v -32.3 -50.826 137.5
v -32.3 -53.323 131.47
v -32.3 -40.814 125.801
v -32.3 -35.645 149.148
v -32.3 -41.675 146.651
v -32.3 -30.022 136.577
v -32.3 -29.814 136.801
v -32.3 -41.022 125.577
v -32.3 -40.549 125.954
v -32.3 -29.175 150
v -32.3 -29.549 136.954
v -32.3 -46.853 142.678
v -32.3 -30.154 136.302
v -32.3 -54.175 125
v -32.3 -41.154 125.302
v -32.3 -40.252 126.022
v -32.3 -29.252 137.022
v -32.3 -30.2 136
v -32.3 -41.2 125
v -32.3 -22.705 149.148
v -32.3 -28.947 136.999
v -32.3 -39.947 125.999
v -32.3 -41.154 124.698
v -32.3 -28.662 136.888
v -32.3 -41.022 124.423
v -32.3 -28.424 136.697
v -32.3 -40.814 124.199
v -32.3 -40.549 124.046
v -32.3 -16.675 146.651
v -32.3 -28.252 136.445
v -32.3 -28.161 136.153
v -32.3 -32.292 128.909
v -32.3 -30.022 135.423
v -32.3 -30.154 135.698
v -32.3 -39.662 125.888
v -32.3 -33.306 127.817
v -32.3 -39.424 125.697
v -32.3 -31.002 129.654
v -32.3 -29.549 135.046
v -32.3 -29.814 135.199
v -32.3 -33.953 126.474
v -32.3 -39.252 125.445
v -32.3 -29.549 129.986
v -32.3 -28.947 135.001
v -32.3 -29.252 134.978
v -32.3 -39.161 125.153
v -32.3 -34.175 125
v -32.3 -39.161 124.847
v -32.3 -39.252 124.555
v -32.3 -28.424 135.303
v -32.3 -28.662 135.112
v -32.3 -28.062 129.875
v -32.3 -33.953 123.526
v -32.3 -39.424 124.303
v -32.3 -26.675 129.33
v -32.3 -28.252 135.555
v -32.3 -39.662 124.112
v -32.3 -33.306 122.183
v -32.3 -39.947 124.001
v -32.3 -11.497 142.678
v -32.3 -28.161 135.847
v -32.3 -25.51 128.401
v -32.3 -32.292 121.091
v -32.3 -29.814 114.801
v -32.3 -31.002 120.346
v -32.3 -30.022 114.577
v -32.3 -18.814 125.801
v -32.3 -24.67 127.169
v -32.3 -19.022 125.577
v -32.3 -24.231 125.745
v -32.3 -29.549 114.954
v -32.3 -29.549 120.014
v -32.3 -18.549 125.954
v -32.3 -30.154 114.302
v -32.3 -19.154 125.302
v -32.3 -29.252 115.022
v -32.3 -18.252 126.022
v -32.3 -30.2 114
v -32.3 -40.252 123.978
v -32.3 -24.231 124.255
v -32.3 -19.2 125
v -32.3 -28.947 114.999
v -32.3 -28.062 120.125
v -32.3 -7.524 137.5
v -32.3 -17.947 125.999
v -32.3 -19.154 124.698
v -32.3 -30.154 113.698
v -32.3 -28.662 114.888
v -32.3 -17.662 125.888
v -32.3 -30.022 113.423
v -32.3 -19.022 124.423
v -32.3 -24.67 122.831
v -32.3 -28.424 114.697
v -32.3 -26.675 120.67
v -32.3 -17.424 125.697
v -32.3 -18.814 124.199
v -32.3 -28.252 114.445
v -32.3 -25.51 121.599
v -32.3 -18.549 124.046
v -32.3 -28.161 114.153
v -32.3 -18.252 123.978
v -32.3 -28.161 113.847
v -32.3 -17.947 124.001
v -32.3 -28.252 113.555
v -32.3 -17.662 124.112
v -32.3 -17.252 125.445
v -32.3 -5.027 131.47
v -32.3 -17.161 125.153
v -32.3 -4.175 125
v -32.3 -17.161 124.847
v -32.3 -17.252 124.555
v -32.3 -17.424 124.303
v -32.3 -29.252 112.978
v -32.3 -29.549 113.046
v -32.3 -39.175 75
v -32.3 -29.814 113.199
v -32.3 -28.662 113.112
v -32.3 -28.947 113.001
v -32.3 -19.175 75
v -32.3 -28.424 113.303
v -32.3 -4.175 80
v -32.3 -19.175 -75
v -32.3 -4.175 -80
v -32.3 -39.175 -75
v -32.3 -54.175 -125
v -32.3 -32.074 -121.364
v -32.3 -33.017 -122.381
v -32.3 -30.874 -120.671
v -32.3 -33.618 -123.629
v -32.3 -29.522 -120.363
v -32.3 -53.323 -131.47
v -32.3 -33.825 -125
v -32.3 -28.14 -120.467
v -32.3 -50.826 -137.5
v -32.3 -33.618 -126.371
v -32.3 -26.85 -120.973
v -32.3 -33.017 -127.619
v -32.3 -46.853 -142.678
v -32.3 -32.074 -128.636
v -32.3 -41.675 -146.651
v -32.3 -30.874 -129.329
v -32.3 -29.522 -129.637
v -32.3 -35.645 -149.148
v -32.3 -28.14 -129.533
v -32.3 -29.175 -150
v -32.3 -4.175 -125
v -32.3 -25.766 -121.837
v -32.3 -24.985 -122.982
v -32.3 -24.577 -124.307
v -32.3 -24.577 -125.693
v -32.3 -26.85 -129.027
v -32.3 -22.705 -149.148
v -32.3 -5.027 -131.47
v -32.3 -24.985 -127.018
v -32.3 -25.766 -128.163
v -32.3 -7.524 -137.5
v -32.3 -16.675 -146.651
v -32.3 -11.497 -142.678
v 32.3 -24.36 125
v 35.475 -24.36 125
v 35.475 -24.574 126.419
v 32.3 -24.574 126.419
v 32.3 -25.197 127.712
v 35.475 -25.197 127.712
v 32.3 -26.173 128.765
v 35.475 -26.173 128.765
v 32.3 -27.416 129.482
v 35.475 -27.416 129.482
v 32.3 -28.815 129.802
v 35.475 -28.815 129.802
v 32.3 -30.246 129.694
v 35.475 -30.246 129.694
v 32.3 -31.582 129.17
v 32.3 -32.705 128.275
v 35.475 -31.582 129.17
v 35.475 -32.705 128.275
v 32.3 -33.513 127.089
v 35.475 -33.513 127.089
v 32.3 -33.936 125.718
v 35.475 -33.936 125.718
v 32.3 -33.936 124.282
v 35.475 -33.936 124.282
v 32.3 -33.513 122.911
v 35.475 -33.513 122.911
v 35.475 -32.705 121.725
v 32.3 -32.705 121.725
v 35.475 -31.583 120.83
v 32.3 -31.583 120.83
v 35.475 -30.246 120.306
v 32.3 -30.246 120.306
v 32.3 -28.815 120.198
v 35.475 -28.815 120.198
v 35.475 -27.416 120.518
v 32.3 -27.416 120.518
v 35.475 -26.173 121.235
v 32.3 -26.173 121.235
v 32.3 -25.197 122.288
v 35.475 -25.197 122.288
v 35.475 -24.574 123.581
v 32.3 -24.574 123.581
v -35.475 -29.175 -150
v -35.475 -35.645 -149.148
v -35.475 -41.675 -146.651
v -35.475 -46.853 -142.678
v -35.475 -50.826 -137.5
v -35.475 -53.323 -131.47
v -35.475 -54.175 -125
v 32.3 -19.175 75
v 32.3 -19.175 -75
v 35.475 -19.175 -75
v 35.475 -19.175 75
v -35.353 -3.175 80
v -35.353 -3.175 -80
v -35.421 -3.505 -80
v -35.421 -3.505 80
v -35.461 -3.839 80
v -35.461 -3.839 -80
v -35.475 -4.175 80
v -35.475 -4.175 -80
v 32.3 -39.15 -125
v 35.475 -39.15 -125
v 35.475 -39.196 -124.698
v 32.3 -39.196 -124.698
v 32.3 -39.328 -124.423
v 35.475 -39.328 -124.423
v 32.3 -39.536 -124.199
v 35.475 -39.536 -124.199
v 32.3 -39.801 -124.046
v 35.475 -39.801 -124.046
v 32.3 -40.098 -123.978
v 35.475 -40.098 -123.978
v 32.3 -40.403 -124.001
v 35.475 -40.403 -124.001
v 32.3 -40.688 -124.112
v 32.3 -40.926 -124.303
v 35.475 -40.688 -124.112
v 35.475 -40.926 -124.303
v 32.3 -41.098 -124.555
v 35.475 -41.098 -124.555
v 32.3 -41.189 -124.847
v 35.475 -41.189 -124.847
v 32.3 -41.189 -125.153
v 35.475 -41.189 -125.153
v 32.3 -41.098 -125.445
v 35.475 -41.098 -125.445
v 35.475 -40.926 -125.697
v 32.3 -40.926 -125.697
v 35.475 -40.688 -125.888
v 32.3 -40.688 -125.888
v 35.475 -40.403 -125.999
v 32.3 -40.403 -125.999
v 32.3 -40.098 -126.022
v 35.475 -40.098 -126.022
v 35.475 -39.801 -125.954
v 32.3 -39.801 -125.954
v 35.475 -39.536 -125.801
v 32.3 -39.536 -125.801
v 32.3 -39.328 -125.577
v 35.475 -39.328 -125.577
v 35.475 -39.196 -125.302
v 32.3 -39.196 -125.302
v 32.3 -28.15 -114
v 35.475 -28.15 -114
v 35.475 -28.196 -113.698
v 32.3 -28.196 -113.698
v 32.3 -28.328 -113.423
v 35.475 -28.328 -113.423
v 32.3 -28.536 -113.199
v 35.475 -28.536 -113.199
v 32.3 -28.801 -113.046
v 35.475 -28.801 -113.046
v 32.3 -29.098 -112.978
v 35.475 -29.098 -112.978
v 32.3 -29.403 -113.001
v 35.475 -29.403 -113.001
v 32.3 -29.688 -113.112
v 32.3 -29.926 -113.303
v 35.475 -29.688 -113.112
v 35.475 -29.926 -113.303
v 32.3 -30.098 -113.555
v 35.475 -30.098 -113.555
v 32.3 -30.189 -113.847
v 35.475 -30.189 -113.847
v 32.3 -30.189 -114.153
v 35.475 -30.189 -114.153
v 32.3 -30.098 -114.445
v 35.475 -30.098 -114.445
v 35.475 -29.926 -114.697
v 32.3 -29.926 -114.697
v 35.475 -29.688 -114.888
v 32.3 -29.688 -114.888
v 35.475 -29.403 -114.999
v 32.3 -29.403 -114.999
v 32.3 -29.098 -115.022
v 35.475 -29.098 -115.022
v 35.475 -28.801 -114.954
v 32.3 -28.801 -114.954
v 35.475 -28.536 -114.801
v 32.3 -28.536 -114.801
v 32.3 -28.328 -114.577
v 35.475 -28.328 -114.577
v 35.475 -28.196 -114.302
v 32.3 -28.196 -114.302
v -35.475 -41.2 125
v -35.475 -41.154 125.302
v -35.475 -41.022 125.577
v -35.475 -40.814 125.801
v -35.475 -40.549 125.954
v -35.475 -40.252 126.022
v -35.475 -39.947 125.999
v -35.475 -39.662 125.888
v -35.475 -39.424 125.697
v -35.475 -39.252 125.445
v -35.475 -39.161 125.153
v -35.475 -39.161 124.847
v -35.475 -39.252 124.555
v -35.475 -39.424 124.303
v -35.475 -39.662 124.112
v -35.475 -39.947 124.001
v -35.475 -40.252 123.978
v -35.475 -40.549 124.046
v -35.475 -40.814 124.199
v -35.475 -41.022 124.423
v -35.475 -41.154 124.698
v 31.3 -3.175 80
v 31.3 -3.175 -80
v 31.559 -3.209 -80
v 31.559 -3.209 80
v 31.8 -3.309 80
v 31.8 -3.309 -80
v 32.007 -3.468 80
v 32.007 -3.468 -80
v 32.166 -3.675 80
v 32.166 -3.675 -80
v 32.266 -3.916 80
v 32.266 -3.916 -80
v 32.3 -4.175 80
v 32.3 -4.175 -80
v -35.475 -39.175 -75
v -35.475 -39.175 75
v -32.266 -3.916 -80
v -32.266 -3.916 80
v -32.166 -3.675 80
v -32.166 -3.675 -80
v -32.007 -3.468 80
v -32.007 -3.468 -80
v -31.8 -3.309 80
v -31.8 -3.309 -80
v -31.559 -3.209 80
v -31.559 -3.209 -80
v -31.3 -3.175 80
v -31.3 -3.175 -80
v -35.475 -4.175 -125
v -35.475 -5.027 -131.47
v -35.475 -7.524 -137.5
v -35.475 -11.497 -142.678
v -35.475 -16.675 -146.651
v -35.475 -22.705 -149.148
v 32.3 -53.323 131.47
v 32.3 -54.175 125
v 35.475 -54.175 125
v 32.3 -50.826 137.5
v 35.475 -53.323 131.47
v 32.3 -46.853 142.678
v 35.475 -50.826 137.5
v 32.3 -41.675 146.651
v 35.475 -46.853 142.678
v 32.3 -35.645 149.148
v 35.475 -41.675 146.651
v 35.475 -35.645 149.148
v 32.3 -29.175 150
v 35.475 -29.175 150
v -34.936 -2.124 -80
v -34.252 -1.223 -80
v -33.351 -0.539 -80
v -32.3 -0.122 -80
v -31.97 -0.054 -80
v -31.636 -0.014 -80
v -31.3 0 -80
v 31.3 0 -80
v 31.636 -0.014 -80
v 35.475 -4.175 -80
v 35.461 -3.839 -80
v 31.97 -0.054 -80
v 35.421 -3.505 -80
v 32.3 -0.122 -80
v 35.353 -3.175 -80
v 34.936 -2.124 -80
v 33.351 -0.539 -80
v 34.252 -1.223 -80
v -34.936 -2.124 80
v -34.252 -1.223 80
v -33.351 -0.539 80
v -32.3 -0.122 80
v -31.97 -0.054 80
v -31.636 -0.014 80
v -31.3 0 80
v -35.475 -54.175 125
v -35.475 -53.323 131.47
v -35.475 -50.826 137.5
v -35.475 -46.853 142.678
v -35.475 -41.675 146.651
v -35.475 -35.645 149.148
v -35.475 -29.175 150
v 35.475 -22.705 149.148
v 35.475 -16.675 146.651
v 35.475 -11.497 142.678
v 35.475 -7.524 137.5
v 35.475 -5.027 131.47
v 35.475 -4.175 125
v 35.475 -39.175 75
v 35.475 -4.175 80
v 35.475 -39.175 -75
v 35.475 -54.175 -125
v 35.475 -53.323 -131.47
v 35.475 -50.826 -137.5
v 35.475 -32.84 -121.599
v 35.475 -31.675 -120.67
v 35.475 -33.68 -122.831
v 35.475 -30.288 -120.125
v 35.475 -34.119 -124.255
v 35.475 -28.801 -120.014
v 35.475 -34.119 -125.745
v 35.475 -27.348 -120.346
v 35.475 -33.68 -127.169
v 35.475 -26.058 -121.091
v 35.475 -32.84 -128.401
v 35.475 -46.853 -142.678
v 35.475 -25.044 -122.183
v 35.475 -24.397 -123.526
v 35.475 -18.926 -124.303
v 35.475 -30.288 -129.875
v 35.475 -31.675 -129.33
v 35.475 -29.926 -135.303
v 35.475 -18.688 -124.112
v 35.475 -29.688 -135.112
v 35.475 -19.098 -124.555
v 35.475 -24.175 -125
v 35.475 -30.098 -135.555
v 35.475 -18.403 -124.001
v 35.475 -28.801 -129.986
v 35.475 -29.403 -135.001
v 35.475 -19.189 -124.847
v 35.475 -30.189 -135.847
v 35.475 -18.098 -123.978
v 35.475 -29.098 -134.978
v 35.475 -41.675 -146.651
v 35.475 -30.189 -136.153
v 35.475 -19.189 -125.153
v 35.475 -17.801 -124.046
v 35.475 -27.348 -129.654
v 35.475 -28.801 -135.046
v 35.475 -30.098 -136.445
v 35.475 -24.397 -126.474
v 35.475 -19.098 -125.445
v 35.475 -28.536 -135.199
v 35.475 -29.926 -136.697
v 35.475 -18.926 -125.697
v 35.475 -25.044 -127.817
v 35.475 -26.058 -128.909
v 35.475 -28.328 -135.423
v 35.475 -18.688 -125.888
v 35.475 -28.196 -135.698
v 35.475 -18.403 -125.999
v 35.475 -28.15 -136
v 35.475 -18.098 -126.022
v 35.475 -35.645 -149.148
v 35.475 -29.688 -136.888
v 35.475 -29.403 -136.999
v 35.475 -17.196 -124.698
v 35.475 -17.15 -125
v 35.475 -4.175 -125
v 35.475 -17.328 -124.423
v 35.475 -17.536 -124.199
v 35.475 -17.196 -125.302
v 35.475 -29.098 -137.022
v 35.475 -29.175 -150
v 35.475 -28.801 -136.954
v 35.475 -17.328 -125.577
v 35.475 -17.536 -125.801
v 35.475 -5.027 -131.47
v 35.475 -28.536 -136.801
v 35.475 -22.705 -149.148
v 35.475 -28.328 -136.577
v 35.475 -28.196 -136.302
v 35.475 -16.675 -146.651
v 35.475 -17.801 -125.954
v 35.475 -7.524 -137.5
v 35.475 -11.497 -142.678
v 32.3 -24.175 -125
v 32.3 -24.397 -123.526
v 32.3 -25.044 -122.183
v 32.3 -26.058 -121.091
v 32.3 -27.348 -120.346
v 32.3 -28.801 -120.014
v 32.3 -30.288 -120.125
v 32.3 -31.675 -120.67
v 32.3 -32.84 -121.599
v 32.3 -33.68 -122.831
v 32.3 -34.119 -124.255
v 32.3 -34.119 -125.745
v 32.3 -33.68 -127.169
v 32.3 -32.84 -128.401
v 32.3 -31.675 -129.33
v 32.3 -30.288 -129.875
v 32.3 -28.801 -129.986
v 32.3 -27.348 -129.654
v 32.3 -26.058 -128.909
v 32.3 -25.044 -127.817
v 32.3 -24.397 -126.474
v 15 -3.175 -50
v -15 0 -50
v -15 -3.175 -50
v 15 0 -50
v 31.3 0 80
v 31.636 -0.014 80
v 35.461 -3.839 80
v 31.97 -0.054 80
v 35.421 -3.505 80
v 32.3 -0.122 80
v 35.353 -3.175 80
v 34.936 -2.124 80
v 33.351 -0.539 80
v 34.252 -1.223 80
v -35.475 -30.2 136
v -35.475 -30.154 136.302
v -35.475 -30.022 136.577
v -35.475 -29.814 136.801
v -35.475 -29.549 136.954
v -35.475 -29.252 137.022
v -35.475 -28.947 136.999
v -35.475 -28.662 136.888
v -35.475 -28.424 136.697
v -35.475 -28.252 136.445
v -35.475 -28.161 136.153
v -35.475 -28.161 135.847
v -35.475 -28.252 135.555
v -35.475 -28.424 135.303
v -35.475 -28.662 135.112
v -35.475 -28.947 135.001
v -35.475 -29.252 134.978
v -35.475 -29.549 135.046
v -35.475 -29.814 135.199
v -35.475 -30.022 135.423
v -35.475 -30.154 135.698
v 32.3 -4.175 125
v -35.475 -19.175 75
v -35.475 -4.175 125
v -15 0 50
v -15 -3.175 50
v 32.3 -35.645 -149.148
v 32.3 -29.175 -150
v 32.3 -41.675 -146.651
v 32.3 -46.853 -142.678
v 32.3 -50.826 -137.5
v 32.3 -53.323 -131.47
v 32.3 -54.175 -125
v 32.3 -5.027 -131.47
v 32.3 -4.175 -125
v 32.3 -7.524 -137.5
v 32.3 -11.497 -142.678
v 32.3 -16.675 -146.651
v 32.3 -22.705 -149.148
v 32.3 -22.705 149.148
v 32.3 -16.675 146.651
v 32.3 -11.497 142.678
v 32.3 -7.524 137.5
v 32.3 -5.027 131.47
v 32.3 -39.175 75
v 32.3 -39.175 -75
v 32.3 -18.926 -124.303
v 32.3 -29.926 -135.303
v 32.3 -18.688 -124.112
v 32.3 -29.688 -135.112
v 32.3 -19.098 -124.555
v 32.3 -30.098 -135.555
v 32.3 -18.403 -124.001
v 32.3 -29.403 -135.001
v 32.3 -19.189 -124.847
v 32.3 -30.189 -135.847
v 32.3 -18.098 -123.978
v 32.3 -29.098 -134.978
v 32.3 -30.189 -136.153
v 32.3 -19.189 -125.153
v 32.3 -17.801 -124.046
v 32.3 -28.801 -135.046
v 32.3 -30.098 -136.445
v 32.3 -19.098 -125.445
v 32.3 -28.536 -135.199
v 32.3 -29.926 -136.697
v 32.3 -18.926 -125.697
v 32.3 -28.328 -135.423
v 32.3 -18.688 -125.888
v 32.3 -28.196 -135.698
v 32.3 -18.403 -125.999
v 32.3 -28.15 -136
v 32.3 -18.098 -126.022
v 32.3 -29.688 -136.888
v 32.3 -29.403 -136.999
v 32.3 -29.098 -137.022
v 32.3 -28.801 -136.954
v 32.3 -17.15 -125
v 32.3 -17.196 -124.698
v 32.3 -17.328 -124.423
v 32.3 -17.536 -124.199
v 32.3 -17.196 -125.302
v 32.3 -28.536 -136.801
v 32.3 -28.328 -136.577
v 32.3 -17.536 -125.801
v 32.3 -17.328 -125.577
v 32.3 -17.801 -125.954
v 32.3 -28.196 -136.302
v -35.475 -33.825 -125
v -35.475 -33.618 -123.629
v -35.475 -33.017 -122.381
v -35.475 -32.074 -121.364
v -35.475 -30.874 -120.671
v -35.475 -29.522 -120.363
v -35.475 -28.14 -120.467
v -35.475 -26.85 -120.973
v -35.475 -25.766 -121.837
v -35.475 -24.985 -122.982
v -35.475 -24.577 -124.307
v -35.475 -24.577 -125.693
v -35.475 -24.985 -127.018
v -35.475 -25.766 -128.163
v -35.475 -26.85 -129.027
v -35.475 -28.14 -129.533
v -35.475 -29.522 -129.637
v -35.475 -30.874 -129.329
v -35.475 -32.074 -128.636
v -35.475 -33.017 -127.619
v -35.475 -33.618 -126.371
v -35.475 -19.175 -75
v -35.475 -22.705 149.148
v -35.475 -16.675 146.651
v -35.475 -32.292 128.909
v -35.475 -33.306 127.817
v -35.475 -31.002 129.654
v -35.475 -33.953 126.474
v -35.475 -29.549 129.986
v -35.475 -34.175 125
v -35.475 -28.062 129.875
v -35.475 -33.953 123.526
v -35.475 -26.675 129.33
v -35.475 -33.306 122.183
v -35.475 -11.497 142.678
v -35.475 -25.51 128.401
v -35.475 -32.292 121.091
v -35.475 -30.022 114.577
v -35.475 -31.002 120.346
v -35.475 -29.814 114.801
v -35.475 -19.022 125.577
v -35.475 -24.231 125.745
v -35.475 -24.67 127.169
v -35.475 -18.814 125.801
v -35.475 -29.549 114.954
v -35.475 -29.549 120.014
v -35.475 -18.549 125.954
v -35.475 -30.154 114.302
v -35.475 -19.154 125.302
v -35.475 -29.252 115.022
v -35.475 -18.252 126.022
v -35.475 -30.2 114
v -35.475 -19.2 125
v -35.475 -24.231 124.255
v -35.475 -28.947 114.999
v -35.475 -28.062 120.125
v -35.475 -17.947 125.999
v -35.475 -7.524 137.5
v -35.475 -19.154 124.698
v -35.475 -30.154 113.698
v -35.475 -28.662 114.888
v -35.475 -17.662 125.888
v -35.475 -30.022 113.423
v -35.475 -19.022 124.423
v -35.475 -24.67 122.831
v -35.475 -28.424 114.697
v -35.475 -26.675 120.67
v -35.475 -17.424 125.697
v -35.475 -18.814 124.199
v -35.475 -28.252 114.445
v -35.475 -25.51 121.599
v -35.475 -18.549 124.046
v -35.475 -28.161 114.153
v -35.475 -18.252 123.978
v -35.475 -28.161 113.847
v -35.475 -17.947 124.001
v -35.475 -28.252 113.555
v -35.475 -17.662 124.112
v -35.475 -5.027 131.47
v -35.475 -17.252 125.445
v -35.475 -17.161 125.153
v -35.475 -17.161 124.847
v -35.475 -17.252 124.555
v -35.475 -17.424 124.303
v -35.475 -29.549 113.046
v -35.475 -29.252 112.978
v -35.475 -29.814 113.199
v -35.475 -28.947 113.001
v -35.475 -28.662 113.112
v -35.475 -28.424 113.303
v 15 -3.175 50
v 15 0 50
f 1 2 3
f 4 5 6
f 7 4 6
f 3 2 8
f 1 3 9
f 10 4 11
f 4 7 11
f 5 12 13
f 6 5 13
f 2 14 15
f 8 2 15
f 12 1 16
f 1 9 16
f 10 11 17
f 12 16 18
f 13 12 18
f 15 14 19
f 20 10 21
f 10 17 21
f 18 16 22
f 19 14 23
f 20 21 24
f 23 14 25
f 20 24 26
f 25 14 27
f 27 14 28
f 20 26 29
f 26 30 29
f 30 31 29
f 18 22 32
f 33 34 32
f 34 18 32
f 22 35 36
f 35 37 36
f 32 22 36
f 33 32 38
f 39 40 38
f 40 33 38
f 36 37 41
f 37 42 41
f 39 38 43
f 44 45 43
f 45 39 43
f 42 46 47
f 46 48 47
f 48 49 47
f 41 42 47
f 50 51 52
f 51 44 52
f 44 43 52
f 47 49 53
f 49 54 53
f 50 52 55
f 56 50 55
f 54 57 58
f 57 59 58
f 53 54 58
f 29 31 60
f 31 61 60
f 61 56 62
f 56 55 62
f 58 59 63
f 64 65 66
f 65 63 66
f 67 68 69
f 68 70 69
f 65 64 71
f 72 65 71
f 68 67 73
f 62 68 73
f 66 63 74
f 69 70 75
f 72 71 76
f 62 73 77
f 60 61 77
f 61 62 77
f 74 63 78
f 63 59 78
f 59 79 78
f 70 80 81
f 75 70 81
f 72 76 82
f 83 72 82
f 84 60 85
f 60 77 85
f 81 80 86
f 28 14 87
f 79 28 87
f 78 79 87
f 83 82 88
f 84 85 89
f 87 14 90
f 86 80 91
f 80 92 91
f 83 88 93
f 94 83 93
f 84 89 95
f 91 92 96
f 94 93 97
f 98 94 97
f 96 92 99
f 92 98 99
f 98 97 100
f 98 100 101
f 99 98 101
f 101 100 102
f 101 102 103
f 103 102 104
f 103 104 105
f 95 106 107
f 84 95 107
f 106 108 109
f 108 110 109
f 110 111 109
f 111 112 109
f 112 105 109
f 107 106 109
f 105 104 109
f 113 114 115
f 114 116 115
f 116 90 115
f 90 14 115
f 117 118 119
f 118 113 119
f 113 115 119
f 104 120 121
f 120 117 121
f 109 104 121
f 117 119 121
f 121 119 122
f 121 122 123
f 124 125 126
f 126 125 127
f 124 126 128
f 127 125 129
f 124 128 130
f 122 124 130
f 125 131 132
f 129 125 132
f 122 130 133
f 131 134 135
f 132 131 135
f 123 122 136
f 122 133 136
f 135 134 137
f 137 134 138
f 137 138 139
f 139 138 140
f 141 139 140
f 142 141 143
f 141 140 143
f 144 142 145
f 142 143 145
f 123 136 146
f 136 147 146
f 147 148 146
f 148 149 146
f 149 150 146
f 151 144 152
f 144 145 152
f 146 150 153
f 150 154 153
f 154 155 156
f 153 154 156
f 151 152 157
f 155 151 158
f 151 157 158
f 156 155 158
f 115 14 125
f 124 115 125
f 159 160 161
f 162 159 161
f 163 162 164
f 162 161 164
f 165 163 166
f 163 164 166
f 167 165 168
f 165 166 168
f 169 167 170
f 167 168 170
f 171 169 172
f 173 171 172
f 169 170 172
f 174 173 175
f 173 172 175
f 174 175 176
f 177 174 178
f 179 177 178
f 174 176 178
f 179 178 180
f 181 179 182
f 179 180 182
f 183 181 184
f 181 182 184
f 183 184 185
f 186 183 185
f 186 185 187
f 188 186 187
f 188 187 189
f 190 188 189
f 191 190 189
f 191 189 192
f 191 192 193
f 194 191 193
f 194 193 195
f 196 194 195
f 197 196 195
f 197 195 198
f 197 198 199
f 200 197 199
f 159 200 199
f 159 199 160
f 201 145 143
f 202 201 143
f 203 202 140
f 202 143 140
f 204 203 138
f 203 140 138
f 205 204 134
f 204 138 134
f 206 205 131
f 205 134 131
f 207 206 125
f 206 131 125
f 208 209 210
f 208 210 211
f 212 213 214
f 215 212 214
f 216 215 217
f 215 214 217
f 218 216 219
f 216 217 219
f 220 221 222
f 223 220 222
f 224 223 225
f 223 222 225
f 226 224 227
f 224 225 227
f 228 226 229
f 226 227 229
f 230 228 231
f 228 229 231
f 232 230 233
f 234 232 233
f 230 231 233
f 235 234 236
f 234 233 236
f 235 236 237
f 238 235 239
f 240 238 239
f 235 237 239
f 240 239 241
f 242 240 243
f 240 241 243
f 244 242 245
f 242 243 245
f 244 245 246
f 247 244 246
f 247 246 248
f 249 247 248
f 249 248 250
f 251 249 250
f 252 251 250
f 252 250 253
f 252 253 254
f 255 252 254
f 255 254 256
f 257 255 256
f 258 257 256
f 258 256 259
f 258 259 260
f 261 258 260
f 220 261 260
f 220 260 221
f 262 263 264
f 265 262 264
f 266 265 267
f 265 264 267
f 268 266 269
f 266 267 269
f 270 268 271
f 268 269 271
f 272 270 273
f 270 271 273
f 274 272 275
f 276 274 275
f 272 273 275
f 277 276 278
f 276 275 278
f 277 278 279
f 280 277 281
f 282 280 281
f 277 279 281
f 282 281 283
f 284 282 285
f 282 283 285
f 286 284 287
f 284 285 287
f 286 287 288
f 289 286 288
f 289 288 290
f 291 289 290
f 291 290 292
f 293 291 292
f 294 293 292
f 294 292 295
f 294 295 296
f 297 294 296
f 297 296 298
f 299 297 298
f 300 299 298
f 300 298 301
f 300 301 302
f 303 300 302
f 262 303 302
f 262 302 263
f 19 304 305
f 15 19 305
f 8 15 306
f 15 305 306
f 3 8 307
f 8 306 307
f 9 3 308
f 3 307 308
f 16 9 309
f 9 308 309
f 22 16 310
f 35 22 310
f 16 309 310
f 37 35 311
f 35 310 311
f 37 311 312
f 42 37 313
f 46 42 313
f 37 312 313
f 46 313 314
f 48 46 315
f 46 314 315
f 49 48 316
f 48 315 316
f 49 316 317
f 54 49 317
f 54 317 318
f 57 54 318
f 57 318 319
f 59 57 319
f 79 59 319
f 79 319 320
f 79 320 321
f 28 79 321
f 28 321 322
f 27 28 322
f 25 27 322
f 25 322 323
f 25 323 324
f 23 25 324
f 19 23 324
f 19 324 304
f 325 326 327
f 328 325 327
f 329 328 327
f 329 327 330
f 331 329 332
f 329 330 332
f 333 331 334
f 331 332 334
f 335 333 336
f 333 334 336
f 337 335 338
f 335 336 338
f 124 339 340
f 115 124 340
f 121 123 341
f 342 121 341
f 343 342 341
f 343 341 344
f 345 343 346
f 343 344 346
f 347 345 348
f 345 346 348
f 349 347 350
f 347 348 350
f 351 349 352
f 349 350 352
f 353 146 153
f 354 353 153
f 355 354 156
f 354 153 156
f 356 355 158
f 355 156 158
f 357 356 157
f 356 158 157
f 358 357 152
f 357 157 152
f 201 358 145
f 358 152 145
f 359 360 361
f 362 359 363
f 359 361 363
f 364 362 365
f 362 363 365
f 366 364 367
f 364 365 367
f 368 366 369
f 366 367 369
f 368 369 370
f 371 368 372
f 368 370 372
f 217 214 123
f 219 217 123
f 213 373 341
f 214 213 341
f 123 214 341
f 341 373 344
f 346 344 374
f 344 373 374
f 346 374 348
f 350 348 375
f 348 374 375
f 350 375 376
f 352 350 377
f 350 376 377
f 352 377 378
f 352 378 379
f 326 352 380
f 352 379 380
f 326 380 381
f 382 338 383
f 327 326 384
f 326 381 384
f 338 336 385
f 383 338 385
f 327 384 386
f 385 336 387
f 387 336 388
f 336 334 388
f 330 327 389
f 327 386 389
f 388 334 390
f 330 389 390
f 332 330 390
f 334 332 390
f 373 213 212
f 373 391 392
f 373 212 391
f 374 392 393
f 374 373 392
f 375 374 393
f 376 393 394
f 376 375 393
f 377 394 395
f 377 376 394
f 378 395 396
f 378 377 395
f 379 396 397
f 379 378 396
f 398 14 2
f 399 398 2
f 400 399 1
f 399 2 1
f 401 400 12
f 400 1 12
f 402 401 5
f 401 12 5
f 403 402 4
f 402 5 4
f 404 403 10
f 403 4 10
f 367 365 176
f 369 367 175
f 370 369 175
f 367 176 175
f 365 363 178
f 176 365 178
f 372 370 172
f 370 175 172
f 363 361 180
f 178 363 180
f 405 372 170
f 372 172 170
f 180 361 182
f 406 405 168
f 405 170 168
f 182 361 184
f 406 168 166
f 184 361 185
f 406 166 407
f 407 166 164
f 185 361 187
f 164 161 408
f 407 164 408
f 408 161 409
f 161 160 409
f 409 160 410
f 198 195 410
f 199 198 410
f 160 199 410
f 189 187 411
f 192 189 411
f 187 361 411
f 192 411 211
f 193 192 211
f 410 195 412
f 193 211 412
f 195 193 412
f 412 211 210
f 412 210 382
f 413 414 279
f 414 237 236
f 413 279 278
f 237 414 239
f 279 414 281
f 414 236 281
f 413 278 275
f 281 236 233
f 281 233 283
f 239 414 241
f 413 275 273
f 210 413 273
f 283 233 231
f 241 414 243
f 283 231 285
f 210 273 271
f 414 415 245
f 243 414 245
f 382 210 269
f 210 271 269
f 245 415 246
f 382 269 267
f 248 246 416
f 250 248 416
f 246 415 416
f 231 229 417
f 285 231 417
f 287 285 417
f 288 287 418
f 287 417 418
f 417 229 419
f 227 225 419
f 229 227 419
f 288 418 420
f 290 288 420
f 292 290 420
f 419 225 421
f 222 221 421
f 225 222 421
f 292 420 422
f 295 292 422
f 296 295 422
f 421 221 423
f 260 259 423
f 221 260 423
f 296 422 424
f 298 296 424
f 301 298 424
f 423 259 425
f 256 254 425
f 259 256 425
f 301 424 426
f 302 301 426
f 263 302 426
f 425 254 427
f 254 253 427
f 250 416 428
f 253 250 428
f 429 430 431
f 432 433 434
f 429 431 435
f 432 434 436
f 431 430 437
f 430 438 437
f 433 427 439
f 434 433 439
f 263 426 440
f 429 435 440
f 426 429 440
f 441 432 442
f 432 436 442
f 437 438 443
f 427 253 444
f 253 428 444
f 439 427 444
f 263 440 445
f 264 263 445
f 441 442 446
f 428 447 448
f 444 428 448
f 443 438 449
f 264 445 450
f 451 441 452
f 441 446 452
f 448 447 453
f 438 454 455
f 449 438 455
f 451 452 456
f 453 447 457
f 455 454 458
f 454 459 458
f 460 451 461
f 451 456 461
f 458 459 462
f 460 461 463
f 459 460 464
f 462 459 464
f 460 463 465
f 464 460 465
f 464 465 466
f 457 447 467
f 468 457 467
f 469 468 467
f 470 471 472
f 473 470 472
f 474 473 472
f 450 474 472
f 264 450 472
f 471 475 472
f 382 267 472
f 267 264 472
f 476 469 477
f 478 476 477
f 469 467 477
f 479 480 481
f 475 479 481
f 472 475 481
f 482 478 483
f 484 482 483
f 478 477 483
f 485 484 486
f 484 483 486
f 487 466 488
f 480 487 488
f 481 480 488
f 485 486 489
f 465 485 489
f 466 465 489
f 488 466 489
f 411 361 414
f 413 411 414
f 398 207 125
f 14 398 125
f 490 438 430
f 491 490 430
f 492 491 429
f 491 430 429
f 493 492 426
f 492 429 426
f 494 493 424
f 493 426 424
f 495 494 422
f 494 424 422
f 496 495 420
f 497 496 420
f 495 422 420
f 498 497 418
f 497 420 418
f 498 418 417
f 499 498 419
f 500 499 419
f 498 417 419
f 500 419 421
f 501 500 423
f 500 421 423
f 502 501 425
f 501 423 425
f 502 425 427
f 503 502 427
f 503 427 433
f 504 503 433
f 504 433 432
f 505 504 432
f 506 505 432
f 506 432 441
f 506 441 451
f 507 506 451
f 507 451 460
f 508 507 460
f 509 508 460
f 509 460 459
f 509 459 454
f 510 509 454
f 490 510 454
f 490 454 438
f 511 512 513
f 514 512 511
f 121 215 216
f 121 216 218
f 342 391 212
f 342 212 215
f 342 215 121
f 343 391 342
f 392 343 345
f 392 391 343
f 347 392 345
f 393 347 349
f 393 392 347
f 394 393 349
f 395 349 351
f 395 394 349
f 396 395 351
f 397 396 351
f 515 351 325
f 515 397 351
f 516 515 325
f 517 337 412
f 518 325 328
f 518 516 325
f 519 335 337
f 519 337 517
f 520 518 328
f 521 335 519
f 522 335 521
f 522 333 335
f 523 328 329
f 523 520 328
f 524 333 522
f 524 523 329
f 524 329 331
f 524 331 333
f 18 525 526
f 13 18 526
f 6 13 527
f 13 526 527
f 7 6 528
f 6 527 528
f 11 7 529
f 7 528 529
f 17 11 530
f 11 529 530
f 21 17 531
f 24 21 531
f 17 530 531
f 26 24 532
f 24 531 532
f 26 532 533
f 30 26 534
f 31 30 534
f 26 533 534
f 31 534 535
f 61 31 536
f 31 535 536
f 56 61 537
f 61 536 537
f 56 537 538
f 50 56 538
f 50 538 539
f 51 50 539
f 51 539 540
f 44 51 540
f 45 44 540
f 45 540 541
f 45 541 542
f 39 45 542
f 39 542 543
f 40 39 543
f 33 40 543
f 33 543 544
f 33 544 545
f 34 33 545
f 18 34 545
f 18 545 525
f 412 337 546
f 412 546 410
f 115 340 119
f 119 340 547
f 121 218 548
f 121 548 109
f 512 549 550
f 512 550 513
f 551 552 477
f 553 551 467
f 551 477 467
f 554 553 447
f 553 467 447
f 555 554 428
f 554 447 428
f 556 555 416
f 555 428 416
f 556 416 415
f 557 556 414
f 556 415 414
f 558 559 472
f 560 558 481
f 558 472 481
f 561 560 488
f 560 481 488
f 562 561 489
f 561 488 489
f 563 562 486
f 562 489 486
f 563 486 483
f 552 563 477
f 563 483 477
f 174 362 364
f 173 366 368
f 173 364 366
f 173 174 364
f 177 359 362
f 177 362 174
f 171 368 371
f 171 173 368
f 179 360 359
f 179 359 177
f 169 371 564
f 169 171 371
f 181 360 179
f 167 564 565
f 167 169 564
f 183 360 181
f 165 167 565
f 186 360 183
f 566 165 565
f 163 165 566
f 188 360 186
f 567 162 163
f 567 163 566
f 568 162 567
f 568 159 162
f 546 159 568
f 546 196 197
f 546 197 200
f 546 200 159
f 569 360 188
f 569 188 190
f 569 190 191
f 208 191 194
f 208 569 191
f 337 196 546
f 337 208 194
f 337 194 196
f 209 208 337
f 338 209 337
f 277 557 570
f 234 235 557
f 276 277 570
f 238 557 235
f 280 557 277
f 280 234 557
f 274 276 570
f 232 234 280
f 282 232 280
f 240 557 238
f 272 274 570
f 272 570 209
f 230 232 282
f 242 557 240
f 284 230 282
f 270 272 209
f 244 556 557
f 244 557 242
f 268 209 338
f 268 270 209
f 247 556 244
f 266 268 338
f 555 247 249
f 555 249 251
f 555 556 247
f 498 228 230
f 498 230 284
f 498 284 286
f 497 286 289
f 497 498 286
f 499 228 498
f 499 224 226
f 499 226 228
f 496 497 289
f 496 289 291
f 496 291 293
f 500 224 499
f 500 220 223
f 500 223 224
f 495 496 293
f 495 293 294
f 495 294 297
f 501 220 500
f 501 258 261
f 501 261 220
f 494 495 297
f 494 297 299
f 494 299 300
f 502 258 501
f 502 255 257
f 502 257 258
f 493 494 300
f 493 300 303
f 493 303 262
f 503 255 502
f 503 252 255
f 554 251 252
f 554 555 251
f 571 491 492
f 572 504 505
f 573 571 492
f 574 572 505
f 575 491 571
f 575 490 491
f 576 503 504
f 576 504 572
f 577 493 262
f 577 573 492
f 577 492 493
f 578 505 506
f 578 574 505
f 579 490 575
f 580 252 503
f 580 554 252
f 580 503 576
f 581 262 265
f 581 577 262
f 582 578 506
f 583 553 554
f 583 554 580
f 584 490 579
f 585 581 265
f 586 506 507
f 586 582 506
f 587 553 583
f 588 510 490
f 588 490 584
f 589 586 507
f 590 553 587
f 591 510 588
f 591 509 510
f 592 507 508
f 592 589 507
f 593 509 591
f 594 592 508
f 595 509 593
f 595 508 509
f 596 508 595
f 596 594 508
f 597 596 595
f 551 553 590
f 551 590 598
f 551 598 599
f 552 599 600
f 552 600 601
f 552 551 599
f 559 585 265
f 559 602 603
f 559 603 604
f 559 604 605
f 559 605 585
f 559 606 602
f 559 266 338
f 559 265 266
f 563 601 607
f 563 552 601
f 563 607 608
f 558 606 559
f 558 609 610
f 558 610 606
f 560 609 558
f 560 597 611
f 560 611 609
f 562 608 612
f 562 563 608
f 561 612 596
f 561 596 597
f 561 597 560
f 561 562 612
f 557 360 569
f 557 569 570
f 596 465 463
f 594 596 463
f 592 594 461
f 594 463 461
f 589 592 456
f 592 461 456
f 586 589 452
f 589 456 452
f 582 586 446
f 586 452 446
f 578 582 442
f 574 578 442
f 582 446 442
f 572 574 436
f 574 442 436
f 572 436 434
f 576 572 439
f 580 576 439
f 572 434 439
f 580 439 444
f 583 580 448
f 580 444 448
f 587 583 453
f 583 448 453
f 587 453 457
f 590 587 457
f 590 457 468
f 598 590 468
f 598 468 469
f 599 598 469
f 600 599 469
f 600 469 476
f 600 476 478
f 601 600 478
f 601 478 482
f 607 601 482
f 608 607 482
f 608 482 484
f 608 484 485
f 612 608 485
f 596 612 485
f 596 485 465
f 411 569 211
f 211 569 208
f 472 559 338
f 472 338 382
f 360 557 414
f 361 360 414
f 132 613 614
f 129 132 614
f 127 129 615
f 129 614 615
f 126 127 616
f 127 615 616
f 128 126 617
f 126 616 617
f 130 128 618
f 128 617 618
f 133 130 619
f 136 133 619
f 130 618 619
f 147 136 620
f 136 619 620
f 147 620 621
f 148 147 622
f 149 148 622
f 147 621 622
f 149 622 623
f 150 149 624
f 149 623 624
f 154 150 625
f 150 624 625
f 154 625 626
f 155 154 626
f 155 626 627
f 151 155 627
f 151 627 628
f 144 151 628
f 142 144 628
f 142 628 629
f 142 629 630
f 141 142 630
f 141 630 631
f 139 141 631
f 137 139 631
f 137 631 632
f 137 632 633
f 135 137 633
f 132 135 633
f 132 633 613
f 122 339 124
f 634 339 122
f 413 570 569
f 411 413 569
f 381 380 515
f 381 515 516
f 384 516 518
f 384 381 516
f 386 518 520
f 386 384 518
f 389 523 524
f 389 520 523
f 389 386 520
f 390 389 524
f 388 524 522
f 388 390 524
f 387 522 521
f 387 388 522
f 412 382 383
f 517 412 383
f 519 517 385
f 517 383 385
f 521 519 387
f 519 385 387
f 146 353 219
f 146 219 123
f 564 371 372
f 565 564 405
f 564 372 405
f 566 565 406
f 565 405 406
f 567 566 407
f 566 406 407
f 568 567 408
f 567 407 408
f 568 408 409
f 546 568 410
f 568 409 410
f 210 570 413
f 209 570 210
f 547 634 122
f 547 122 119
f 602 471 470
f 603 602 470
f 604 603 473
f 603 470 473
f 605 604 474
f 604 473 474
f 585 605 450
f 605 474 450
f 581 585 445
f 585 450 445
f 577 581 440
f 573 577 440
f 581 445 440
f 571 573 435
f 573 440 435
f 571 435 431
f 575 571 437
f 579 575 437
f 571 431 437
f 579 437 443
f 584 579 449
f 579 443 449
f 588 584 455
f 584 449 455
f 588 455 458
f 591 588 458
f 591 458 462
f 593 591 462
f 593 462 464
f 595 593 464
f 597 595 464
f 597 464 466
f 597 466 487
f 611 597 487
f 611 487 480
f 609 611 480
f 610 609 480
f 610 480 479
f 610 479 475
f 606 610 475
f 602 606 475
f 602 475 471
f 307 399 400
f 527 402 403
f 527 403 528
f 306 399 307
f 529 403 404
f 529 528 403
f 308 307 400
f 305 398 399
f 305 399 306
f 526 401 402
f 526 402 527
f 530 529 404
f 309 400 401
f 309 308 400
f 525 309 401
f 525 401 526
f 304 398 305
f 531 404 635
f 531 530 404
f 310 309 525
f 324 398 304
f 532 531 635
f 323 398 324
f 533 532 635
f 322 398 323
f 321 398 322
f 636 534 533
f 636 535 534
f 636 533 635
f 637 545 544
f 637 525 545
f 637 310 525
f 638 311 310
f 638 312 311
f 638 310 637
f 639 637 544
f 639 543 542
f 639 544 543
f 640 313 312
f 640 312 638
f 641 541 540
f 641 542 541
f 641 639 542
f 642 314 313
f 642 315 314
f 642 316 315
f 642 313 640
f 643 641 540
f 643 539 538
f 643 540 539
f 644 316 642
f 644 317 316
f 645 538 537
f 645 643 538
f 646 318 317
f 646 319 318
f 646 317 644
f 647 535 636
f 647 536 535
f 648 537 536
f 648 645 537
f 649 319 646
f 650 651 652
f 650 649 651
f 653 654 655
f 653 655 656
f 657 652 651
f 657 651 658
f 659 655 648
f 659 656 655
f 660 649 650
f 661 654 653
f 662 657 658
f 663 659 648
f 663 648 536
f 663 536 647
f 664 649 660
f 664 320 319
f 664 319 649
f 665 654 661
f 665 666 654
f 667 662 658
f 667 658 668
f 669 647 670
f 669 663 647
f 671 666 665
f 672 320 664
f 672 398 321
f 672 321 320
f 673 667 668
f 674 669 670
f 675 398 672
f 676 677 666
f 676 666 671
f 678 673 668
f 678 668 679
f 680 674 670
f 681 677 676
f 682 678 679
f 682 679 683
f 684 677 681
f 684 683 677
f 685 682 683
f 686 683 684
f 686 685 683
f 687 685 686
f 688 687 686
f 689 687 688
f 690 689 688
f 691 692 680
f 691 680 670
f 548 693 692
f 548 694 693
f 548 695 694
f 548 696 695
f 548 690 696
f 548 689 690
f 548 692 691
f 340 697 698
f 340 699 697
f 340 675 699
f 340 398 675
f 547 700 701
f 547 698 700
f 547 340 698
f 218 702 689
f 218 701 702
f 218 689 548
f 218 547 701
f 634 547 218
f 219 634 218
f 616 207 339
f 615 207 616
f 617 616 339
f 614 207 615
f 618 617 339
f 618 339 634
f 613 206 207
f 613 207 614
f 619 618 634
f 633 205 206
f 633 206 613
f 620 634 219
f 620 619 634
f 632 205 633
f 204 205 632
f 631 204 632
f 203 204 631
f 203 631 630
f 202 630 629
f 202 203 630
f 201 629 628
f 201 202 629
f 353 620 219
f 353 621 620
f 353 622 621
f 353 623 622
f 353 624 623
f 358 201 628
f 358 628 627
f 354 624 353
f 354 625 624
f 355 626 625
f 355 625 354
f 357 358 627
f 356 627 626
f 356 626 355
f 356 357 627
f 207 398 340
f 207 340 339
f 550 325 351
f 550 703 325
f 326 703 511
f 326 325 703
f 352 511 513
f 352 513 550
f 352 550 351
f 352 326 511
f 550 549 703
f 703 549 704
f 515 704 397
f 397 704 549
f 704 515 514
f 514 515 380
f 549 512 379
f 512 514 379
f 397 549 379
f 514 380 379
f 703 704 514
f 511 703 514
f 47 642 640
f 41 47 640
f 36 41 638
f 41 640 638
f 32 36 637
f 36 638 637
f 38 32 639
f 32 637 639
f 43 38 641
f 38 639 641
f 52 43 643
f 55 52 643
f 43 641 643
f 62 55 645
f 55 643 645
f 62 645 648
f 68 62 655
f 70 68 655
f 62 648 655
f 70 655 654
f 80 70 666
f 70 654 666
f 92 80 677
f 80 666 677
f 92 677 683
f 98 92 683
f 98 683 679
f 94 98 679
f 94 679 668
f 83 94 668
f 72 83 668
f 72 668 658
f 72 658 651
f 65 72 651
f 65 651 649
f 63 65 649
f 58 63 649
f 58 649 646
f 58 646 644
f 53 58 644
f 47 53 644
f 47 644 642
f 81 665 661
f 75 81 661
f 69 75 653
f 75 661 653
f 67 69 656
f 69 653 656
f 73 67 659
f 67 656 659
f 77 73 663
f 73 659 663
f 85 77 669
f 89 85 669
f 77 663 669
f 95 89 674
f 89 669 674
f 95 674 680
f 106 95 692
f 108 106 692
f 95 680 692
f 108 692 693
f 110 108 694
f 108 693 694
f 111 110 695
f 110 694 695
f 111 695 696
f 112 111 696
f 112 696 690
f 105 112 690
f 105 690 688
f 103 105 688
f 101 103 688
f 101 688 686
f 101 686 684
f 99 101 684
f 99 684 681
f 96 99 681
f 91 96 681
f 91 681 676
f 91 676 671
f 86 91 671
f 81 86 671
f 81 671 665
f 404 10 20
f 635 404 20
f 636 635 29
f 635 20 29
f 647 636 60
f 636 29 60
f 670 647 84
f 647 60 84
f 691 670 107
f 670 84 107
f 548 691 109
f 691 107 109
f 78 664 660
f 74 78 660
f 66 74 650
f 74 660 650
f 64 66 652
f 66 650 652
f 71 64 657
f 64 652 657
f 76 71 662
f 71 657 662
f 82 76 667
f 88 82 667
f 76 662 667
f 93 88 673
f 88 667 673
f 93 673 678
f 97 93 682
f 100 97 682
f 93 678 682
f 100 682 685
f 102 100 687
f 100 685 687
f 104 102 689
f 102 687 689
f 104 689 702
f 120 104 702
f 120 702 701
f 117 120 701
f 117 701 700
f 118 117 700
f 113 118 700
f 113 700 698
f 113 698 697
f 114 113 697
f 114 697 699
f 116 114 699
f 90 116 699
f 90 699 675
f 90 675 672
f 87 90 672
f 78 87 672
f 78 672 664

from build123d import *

# Parameters (mm, degrees)
BASE_FLANGE1_DEPTH         = 3.175
SKETCHED_START             = -150
SKETCHED_BEND1_DEPTH       = 300
SKETCHED_BEND1_2_DEPTH     = 70
SKETCHED_START_2           = 80
SKETCHED_BEND1_3_DEPTH     = 70
SKETCHED_BEND1_4_OUTLINE_W = 3.175
SKETCHED_BEND1_4_OUTLINE_H = 50
SKETCHED_BEND1_4_DEPTH     = 300
SKETCHED_START_3           = -80
SKETCHED_BEND1_5_DEPTH     = 160
SKETCH7_R                  = 4.815
CUT_EXTRUDE1_DEPTH         = 10
SKETCH8_R                  = 5
SKETCH8_R_2                = 1.025
CUT_EXTRUDE2_DEPTH         = 10
SKETCH9_R                  = 4.65
SKETCH9_R_2                = 5
SKETCH9_R_3                = 1.025
CUT_EXTRUDE3_DEPTH         = 10
CUT_EXTRUDE4_DEPTH         = 175.553238655
CUT_EXTRUDE5_DEPTH         = 175.553238655
SKETCH13_W                 = 30
SKETCH13_H                 = 100
CUT_EXTRUDE6_DEPTH         = 10
SKETCH14_W                 = 150
SKETCH14_H                 = 20
CUT_EXTRUDE7_DEPTH         = 175.553238655


# Read off the part's stored shape, not the designer's step: Sketched Bend1
# Sheet-metal steps are written as plain solids
with BuildPart() as part:
    # Sketch1 → Base-Flange1 (new body)
    with BuildSketch(Plane(origin=(0, 0, 0), x_dir=(1, 0, 0), z_dir=(0, 1, 0))):
        Polygon((-82.3, 150), (-32.3, 150), (-32.3, 80), (32.3, 80), (32.3, 150), (82.3, 150), (82.3, -150), (32.3, -150), (32.3, -80), (-32.3, -80), (-32.3, -150), (-82.3, -150), align=None)
    extrude(amount=-BASE_FLANGE1_DEPTH)

    # Sketched Bend1 outline → Sketched Bend1 (cut)
    with BuildSketch(Plane.XY.offset(SKETCHED_START)):
        with BuildLine():
            Line((-82.3, -3.175), (-35.353470735, -3.175))
            ThreePointArc((-35.353470735, -3.175), (-33.874453825, -0.888236775), (-31.3, 0))
            Line((-31.3, 0), (-82.3, 0))
            Line((-82.3, 0), (-82.3, -3.175))
        make_face()
        with BuildLine():
            Line((82.3, 0), (31.3, 0))
            ThreePointArc((31.3, 0), (33.874453825, -0.888236775), (35.353470735, -3.175))
            Line((35.353470735, -3.175), (82.3, -3.175))
            Line((82.3, -3.175), (82.3, 0))
        make_face()
    extrude(amount=SKETCHED_BEND1_DEPTH, mode=Mode.SUBTRACT)

    # Sketched Bend1 2 outline → Sketched Bend1 2 (cut)
    with BuildSketch(Plane.XY.offset(SKETCHED_START)):
        with BuildLine():
            Line((-35.353470735, -3.175), (-32.3, -3.175))
            Line((-32.3, -3.175), (-32.3, -0.121529265))
            ThreePointArc((-32.3, -0.121529265), (-34.252170811, -1.222829189), (-35.353470735, -3.175))
        make_face()
        with BuildLine():
            Line((32.3, -0.121529265), (32.3, -3.175))
            Line((32.3, -3.175), (35.353470735, -3.175))
            ThreePointArc((35.353470735, -3.175), (34.252170811, -1.222829189), (32.3, -0.121529265))
        make_face()
    extrude(amount=SKETCHED_BEND1_2_DEPTH, mode=Mode.SUBTRACT)

    # Sketched Bend1 3 outline → Sketched Bend1 3 (cut)
    with BuildSketch(Plane.XY.offset(SKETCHED_START_2)):
        with BuildLine():
            Line((-35.353470735, -3.175), (-32.3, -3.175))
            Line((-32.3, -3.175), (-32.3, -0.121529265))
            ThreePointArc((-32.3, -0.121529265), (-34.252170811, -1.222829189), (-35.353470735, -3.175))
        make_face()
        with BuildLine():
            Line((32.3, -0.121529265), (32.3, -3.175))
            Line((32.3, -3.175), (35.353470735, -3.175))
            ThreePointArc((35.353470735, -3.175), (34.252170811, -1.222829189), (32.3, -0.121529265))
        make_face()
    extrude(amount=SKETCHED_BEND1_3_DEPTH, mode=Mode.SUBTRACT)



with BuildPart() as body_2:
    # Sketched Bend1 4 outline → Sketched Bend1 4 (new body)
    with BuildSketch(Plane.XY.offset(SKETCHED_START)):
        with Locations((-33.8875, -29.175)):
            Rectangle(SKETCHED_BEND1_4_OUTLINE_W, SKETCHED_BEND1_4_OUTLINE_H)
        with Locations((33.8875, -29.175)):
            Rectangle(SKETCHED_BEND1_4_OUTLINE_W, SKETCHED_BEND1_4_OUTLINE_H)
    extrude(amount=SKETCHED_BEND1_4_DEPTH)


with BuildPart() as part_1:
    add(part.part)

    add(body_2.part)  # Sketched Bend1 5 merges body 2
    # Sketched Bend1 5 outline → Sketched Bend1 5 (add)
    with BuildSketch(Plane.XY.offset(SKETCHED_START_3)):
        with BuildLine():
            Line((-35.475, -4.175), (-32.3, -4.175))
            ThreePointArc((-32.3, -4.175), (-32.007106781, -3.467893219), (-31.3, -3.175))
            Line((-31.3, -3.175), (-35.353470735, -3.175))
            ThreePointArc((-35.353470735, -3.175), (-35.444506323, -3.671321193), (-35.475, -4.175))
        make_face()
        with BuildLine():
            Line((35.353470735, -3.175), (31.3, -3.175))
            ThreePointArc((31.3, -3.175), (32.007106781, -3.467893219), (32.3, -4.175))
            Line((32.3, -4.175), (35.475, -4.175))
            ThreePointArc((35.475, -4.175), (35.444506323, -3.671321193), (35.353470735, -3.175))
        make_face()
    extrude(amount=SKETCHED_BEND1_5_DEPTH)

    # Sketch7 → Cut-Extrude1 (cut)
    with BuildSketch(Plane(origin=(35.475, 0, 0), x_dir=(0, 0, -1), z_dir=(1, 0, 0))):
        with Locations(Location((-125, -29.175, 0), (0, 0, 90))):
            Circle(SKETCH7_R)
    extrude(amount=-CUT_EXTRUDE1_DEPTH, mode=Mode.SUBTRACT)

    # Sketch8 → Cut-Extrude2 (cut)
    with BuildSketch(Plane(origin=(35.475, 0, 0), x_dir=(0, 0, -1), z_dir=(1, 0, 0))):
        with Locations(Location((125, -29.175, 0), (0, 0, 90))):
            Circle(SKETCH8_R)
        with Locations(Location((125, -18.175, 0), (0, 0, 90))):
            Circle(SKETCH8_R_2)
        with Locations(Location((125, -40.175, 0), (0, 0, 90))):
            Circle(SKETCH8_R_2)
        with Locations(Location((136, -29.175, 0), (0, 0, 90))):
            Circle(SKETCH8_R_2)
        with Locations(Location((114, -29.175, 0), (0, 0, 90))):
            Circle(SKETCH8_R_2)
    extrude(amount=-CUT_EXTRUDE2_DEPTH, mode=Mode.SUBTRACT)

    # Sketch9 → Cut-Extrude3 (cut)
    with BuildSketch(Plane.ZY.offset(35.475)):
        with Locations(Location((-125, -29.175, 0), (0, 0, 270))):
            Circle(SKETCH9_R)
        with Locations(Location((125, -29.175, 0), (0, 0, 270))):
            Circle(SKETCH9_R_2)
        with Locations(Location((125, -18.175, 0), (0, 0, 270))):
            Circle(SKETCH9_R_3)
        with Locations(Location((114, -29.175, 0), (0, 0, 270))):
            Circle(SKETCH9_R_3)
        with Locations(Location((125, -40.175, 0), (0, 0, 270))):
            Circle(SKETCH9_R_3)
        with Locations(Location((136, -29.175, 0), (0, 0, 270))):
            Circle(SKETCH9_R_3)
    extrude(amount=-CUT_EXTRUDE3_DEPTH, mode=Mode.SUBTRACT)

    # Sketch10 → Cut-Extrude4 (cut, through all)
    with BuildSketch(Plane(origin=(35.475, 0, 0), x_dir=(0, 0, -1), z_dir=(1, 0, 0))):
        with BuildLine():
            ThreePointArc((-150, -29.175), (-142.67766953, -11.49733047), (-125, -4.175))
            Line((-125, -4.175), (-150, -4.175))
            Line((-150, -4.175), (-150, -29.175))
        make_face()
        with BuildLine():
            ThreePointArc((-125, -54.175), (-142.67766953, -46.85266953), (-150, -29.175))
            Line((-150, -29.175), (-150, -54.175))
            Line((-150, -54.175), (-125, -54.175))
        make_face()
    extrude(amount=-CUT_EXTRUDE4_DEPTH, mode=Mode.SUBTRACT)

    # Sketch11 → Cut-Extrude5 (cut, through all)
    with BuildSketch(Plane(origin=(35.475, 0, 0), x_dir=(0, 0, -1), z_dir=(1, 0, 0))):
        with BuildLine():
            Line((150, -4.175), (125, -4.175))
            ThreePointArc((125, -4.175), (142.67766953, -11.49733047), (150, -29.175))
            Line((150, -29.175), (150, -4.175))
        make_face()
        with BuildLine():
            Line((150, -54.175), (150, -29.175))
            ThreePointArc((150, -29.175), (142.67766953, -46.85266953), (125, -54.175))
            Line((125, -54.175), (150, -54.175))
        make_face()
    extrude(amount=-CUT_EXTRUDE5_DEPTH, mode=Mode.SUBTRACT)

    # Sketch13 → Cut-Extrude6 (cut)
    with BuildSketch(Plane(origin=(0, 0, 0), x_dir=(1, 0, 0), z_dir=(0, 1, 0))):
        Rectangle(SKETCH13_W, SKETCH13_H)
    extrude(amount=-CUT_EXTRUDE6_DEPTH, mode=Mode.SUBTRACT)

    # Sketch14 → Cut-Extrude7 (cut, through all)
    with BuildSketch(Plane.ZY.offset(35.475)):
        with Locations((0, -29.175)):
            Rectangle(SKETCH14_W, SKETCH14_H)
    extrude(amount=-CUT_EXTRUDE7_DEPTH, mode=Mode.SUBTRACT)


solid = part_1.part
